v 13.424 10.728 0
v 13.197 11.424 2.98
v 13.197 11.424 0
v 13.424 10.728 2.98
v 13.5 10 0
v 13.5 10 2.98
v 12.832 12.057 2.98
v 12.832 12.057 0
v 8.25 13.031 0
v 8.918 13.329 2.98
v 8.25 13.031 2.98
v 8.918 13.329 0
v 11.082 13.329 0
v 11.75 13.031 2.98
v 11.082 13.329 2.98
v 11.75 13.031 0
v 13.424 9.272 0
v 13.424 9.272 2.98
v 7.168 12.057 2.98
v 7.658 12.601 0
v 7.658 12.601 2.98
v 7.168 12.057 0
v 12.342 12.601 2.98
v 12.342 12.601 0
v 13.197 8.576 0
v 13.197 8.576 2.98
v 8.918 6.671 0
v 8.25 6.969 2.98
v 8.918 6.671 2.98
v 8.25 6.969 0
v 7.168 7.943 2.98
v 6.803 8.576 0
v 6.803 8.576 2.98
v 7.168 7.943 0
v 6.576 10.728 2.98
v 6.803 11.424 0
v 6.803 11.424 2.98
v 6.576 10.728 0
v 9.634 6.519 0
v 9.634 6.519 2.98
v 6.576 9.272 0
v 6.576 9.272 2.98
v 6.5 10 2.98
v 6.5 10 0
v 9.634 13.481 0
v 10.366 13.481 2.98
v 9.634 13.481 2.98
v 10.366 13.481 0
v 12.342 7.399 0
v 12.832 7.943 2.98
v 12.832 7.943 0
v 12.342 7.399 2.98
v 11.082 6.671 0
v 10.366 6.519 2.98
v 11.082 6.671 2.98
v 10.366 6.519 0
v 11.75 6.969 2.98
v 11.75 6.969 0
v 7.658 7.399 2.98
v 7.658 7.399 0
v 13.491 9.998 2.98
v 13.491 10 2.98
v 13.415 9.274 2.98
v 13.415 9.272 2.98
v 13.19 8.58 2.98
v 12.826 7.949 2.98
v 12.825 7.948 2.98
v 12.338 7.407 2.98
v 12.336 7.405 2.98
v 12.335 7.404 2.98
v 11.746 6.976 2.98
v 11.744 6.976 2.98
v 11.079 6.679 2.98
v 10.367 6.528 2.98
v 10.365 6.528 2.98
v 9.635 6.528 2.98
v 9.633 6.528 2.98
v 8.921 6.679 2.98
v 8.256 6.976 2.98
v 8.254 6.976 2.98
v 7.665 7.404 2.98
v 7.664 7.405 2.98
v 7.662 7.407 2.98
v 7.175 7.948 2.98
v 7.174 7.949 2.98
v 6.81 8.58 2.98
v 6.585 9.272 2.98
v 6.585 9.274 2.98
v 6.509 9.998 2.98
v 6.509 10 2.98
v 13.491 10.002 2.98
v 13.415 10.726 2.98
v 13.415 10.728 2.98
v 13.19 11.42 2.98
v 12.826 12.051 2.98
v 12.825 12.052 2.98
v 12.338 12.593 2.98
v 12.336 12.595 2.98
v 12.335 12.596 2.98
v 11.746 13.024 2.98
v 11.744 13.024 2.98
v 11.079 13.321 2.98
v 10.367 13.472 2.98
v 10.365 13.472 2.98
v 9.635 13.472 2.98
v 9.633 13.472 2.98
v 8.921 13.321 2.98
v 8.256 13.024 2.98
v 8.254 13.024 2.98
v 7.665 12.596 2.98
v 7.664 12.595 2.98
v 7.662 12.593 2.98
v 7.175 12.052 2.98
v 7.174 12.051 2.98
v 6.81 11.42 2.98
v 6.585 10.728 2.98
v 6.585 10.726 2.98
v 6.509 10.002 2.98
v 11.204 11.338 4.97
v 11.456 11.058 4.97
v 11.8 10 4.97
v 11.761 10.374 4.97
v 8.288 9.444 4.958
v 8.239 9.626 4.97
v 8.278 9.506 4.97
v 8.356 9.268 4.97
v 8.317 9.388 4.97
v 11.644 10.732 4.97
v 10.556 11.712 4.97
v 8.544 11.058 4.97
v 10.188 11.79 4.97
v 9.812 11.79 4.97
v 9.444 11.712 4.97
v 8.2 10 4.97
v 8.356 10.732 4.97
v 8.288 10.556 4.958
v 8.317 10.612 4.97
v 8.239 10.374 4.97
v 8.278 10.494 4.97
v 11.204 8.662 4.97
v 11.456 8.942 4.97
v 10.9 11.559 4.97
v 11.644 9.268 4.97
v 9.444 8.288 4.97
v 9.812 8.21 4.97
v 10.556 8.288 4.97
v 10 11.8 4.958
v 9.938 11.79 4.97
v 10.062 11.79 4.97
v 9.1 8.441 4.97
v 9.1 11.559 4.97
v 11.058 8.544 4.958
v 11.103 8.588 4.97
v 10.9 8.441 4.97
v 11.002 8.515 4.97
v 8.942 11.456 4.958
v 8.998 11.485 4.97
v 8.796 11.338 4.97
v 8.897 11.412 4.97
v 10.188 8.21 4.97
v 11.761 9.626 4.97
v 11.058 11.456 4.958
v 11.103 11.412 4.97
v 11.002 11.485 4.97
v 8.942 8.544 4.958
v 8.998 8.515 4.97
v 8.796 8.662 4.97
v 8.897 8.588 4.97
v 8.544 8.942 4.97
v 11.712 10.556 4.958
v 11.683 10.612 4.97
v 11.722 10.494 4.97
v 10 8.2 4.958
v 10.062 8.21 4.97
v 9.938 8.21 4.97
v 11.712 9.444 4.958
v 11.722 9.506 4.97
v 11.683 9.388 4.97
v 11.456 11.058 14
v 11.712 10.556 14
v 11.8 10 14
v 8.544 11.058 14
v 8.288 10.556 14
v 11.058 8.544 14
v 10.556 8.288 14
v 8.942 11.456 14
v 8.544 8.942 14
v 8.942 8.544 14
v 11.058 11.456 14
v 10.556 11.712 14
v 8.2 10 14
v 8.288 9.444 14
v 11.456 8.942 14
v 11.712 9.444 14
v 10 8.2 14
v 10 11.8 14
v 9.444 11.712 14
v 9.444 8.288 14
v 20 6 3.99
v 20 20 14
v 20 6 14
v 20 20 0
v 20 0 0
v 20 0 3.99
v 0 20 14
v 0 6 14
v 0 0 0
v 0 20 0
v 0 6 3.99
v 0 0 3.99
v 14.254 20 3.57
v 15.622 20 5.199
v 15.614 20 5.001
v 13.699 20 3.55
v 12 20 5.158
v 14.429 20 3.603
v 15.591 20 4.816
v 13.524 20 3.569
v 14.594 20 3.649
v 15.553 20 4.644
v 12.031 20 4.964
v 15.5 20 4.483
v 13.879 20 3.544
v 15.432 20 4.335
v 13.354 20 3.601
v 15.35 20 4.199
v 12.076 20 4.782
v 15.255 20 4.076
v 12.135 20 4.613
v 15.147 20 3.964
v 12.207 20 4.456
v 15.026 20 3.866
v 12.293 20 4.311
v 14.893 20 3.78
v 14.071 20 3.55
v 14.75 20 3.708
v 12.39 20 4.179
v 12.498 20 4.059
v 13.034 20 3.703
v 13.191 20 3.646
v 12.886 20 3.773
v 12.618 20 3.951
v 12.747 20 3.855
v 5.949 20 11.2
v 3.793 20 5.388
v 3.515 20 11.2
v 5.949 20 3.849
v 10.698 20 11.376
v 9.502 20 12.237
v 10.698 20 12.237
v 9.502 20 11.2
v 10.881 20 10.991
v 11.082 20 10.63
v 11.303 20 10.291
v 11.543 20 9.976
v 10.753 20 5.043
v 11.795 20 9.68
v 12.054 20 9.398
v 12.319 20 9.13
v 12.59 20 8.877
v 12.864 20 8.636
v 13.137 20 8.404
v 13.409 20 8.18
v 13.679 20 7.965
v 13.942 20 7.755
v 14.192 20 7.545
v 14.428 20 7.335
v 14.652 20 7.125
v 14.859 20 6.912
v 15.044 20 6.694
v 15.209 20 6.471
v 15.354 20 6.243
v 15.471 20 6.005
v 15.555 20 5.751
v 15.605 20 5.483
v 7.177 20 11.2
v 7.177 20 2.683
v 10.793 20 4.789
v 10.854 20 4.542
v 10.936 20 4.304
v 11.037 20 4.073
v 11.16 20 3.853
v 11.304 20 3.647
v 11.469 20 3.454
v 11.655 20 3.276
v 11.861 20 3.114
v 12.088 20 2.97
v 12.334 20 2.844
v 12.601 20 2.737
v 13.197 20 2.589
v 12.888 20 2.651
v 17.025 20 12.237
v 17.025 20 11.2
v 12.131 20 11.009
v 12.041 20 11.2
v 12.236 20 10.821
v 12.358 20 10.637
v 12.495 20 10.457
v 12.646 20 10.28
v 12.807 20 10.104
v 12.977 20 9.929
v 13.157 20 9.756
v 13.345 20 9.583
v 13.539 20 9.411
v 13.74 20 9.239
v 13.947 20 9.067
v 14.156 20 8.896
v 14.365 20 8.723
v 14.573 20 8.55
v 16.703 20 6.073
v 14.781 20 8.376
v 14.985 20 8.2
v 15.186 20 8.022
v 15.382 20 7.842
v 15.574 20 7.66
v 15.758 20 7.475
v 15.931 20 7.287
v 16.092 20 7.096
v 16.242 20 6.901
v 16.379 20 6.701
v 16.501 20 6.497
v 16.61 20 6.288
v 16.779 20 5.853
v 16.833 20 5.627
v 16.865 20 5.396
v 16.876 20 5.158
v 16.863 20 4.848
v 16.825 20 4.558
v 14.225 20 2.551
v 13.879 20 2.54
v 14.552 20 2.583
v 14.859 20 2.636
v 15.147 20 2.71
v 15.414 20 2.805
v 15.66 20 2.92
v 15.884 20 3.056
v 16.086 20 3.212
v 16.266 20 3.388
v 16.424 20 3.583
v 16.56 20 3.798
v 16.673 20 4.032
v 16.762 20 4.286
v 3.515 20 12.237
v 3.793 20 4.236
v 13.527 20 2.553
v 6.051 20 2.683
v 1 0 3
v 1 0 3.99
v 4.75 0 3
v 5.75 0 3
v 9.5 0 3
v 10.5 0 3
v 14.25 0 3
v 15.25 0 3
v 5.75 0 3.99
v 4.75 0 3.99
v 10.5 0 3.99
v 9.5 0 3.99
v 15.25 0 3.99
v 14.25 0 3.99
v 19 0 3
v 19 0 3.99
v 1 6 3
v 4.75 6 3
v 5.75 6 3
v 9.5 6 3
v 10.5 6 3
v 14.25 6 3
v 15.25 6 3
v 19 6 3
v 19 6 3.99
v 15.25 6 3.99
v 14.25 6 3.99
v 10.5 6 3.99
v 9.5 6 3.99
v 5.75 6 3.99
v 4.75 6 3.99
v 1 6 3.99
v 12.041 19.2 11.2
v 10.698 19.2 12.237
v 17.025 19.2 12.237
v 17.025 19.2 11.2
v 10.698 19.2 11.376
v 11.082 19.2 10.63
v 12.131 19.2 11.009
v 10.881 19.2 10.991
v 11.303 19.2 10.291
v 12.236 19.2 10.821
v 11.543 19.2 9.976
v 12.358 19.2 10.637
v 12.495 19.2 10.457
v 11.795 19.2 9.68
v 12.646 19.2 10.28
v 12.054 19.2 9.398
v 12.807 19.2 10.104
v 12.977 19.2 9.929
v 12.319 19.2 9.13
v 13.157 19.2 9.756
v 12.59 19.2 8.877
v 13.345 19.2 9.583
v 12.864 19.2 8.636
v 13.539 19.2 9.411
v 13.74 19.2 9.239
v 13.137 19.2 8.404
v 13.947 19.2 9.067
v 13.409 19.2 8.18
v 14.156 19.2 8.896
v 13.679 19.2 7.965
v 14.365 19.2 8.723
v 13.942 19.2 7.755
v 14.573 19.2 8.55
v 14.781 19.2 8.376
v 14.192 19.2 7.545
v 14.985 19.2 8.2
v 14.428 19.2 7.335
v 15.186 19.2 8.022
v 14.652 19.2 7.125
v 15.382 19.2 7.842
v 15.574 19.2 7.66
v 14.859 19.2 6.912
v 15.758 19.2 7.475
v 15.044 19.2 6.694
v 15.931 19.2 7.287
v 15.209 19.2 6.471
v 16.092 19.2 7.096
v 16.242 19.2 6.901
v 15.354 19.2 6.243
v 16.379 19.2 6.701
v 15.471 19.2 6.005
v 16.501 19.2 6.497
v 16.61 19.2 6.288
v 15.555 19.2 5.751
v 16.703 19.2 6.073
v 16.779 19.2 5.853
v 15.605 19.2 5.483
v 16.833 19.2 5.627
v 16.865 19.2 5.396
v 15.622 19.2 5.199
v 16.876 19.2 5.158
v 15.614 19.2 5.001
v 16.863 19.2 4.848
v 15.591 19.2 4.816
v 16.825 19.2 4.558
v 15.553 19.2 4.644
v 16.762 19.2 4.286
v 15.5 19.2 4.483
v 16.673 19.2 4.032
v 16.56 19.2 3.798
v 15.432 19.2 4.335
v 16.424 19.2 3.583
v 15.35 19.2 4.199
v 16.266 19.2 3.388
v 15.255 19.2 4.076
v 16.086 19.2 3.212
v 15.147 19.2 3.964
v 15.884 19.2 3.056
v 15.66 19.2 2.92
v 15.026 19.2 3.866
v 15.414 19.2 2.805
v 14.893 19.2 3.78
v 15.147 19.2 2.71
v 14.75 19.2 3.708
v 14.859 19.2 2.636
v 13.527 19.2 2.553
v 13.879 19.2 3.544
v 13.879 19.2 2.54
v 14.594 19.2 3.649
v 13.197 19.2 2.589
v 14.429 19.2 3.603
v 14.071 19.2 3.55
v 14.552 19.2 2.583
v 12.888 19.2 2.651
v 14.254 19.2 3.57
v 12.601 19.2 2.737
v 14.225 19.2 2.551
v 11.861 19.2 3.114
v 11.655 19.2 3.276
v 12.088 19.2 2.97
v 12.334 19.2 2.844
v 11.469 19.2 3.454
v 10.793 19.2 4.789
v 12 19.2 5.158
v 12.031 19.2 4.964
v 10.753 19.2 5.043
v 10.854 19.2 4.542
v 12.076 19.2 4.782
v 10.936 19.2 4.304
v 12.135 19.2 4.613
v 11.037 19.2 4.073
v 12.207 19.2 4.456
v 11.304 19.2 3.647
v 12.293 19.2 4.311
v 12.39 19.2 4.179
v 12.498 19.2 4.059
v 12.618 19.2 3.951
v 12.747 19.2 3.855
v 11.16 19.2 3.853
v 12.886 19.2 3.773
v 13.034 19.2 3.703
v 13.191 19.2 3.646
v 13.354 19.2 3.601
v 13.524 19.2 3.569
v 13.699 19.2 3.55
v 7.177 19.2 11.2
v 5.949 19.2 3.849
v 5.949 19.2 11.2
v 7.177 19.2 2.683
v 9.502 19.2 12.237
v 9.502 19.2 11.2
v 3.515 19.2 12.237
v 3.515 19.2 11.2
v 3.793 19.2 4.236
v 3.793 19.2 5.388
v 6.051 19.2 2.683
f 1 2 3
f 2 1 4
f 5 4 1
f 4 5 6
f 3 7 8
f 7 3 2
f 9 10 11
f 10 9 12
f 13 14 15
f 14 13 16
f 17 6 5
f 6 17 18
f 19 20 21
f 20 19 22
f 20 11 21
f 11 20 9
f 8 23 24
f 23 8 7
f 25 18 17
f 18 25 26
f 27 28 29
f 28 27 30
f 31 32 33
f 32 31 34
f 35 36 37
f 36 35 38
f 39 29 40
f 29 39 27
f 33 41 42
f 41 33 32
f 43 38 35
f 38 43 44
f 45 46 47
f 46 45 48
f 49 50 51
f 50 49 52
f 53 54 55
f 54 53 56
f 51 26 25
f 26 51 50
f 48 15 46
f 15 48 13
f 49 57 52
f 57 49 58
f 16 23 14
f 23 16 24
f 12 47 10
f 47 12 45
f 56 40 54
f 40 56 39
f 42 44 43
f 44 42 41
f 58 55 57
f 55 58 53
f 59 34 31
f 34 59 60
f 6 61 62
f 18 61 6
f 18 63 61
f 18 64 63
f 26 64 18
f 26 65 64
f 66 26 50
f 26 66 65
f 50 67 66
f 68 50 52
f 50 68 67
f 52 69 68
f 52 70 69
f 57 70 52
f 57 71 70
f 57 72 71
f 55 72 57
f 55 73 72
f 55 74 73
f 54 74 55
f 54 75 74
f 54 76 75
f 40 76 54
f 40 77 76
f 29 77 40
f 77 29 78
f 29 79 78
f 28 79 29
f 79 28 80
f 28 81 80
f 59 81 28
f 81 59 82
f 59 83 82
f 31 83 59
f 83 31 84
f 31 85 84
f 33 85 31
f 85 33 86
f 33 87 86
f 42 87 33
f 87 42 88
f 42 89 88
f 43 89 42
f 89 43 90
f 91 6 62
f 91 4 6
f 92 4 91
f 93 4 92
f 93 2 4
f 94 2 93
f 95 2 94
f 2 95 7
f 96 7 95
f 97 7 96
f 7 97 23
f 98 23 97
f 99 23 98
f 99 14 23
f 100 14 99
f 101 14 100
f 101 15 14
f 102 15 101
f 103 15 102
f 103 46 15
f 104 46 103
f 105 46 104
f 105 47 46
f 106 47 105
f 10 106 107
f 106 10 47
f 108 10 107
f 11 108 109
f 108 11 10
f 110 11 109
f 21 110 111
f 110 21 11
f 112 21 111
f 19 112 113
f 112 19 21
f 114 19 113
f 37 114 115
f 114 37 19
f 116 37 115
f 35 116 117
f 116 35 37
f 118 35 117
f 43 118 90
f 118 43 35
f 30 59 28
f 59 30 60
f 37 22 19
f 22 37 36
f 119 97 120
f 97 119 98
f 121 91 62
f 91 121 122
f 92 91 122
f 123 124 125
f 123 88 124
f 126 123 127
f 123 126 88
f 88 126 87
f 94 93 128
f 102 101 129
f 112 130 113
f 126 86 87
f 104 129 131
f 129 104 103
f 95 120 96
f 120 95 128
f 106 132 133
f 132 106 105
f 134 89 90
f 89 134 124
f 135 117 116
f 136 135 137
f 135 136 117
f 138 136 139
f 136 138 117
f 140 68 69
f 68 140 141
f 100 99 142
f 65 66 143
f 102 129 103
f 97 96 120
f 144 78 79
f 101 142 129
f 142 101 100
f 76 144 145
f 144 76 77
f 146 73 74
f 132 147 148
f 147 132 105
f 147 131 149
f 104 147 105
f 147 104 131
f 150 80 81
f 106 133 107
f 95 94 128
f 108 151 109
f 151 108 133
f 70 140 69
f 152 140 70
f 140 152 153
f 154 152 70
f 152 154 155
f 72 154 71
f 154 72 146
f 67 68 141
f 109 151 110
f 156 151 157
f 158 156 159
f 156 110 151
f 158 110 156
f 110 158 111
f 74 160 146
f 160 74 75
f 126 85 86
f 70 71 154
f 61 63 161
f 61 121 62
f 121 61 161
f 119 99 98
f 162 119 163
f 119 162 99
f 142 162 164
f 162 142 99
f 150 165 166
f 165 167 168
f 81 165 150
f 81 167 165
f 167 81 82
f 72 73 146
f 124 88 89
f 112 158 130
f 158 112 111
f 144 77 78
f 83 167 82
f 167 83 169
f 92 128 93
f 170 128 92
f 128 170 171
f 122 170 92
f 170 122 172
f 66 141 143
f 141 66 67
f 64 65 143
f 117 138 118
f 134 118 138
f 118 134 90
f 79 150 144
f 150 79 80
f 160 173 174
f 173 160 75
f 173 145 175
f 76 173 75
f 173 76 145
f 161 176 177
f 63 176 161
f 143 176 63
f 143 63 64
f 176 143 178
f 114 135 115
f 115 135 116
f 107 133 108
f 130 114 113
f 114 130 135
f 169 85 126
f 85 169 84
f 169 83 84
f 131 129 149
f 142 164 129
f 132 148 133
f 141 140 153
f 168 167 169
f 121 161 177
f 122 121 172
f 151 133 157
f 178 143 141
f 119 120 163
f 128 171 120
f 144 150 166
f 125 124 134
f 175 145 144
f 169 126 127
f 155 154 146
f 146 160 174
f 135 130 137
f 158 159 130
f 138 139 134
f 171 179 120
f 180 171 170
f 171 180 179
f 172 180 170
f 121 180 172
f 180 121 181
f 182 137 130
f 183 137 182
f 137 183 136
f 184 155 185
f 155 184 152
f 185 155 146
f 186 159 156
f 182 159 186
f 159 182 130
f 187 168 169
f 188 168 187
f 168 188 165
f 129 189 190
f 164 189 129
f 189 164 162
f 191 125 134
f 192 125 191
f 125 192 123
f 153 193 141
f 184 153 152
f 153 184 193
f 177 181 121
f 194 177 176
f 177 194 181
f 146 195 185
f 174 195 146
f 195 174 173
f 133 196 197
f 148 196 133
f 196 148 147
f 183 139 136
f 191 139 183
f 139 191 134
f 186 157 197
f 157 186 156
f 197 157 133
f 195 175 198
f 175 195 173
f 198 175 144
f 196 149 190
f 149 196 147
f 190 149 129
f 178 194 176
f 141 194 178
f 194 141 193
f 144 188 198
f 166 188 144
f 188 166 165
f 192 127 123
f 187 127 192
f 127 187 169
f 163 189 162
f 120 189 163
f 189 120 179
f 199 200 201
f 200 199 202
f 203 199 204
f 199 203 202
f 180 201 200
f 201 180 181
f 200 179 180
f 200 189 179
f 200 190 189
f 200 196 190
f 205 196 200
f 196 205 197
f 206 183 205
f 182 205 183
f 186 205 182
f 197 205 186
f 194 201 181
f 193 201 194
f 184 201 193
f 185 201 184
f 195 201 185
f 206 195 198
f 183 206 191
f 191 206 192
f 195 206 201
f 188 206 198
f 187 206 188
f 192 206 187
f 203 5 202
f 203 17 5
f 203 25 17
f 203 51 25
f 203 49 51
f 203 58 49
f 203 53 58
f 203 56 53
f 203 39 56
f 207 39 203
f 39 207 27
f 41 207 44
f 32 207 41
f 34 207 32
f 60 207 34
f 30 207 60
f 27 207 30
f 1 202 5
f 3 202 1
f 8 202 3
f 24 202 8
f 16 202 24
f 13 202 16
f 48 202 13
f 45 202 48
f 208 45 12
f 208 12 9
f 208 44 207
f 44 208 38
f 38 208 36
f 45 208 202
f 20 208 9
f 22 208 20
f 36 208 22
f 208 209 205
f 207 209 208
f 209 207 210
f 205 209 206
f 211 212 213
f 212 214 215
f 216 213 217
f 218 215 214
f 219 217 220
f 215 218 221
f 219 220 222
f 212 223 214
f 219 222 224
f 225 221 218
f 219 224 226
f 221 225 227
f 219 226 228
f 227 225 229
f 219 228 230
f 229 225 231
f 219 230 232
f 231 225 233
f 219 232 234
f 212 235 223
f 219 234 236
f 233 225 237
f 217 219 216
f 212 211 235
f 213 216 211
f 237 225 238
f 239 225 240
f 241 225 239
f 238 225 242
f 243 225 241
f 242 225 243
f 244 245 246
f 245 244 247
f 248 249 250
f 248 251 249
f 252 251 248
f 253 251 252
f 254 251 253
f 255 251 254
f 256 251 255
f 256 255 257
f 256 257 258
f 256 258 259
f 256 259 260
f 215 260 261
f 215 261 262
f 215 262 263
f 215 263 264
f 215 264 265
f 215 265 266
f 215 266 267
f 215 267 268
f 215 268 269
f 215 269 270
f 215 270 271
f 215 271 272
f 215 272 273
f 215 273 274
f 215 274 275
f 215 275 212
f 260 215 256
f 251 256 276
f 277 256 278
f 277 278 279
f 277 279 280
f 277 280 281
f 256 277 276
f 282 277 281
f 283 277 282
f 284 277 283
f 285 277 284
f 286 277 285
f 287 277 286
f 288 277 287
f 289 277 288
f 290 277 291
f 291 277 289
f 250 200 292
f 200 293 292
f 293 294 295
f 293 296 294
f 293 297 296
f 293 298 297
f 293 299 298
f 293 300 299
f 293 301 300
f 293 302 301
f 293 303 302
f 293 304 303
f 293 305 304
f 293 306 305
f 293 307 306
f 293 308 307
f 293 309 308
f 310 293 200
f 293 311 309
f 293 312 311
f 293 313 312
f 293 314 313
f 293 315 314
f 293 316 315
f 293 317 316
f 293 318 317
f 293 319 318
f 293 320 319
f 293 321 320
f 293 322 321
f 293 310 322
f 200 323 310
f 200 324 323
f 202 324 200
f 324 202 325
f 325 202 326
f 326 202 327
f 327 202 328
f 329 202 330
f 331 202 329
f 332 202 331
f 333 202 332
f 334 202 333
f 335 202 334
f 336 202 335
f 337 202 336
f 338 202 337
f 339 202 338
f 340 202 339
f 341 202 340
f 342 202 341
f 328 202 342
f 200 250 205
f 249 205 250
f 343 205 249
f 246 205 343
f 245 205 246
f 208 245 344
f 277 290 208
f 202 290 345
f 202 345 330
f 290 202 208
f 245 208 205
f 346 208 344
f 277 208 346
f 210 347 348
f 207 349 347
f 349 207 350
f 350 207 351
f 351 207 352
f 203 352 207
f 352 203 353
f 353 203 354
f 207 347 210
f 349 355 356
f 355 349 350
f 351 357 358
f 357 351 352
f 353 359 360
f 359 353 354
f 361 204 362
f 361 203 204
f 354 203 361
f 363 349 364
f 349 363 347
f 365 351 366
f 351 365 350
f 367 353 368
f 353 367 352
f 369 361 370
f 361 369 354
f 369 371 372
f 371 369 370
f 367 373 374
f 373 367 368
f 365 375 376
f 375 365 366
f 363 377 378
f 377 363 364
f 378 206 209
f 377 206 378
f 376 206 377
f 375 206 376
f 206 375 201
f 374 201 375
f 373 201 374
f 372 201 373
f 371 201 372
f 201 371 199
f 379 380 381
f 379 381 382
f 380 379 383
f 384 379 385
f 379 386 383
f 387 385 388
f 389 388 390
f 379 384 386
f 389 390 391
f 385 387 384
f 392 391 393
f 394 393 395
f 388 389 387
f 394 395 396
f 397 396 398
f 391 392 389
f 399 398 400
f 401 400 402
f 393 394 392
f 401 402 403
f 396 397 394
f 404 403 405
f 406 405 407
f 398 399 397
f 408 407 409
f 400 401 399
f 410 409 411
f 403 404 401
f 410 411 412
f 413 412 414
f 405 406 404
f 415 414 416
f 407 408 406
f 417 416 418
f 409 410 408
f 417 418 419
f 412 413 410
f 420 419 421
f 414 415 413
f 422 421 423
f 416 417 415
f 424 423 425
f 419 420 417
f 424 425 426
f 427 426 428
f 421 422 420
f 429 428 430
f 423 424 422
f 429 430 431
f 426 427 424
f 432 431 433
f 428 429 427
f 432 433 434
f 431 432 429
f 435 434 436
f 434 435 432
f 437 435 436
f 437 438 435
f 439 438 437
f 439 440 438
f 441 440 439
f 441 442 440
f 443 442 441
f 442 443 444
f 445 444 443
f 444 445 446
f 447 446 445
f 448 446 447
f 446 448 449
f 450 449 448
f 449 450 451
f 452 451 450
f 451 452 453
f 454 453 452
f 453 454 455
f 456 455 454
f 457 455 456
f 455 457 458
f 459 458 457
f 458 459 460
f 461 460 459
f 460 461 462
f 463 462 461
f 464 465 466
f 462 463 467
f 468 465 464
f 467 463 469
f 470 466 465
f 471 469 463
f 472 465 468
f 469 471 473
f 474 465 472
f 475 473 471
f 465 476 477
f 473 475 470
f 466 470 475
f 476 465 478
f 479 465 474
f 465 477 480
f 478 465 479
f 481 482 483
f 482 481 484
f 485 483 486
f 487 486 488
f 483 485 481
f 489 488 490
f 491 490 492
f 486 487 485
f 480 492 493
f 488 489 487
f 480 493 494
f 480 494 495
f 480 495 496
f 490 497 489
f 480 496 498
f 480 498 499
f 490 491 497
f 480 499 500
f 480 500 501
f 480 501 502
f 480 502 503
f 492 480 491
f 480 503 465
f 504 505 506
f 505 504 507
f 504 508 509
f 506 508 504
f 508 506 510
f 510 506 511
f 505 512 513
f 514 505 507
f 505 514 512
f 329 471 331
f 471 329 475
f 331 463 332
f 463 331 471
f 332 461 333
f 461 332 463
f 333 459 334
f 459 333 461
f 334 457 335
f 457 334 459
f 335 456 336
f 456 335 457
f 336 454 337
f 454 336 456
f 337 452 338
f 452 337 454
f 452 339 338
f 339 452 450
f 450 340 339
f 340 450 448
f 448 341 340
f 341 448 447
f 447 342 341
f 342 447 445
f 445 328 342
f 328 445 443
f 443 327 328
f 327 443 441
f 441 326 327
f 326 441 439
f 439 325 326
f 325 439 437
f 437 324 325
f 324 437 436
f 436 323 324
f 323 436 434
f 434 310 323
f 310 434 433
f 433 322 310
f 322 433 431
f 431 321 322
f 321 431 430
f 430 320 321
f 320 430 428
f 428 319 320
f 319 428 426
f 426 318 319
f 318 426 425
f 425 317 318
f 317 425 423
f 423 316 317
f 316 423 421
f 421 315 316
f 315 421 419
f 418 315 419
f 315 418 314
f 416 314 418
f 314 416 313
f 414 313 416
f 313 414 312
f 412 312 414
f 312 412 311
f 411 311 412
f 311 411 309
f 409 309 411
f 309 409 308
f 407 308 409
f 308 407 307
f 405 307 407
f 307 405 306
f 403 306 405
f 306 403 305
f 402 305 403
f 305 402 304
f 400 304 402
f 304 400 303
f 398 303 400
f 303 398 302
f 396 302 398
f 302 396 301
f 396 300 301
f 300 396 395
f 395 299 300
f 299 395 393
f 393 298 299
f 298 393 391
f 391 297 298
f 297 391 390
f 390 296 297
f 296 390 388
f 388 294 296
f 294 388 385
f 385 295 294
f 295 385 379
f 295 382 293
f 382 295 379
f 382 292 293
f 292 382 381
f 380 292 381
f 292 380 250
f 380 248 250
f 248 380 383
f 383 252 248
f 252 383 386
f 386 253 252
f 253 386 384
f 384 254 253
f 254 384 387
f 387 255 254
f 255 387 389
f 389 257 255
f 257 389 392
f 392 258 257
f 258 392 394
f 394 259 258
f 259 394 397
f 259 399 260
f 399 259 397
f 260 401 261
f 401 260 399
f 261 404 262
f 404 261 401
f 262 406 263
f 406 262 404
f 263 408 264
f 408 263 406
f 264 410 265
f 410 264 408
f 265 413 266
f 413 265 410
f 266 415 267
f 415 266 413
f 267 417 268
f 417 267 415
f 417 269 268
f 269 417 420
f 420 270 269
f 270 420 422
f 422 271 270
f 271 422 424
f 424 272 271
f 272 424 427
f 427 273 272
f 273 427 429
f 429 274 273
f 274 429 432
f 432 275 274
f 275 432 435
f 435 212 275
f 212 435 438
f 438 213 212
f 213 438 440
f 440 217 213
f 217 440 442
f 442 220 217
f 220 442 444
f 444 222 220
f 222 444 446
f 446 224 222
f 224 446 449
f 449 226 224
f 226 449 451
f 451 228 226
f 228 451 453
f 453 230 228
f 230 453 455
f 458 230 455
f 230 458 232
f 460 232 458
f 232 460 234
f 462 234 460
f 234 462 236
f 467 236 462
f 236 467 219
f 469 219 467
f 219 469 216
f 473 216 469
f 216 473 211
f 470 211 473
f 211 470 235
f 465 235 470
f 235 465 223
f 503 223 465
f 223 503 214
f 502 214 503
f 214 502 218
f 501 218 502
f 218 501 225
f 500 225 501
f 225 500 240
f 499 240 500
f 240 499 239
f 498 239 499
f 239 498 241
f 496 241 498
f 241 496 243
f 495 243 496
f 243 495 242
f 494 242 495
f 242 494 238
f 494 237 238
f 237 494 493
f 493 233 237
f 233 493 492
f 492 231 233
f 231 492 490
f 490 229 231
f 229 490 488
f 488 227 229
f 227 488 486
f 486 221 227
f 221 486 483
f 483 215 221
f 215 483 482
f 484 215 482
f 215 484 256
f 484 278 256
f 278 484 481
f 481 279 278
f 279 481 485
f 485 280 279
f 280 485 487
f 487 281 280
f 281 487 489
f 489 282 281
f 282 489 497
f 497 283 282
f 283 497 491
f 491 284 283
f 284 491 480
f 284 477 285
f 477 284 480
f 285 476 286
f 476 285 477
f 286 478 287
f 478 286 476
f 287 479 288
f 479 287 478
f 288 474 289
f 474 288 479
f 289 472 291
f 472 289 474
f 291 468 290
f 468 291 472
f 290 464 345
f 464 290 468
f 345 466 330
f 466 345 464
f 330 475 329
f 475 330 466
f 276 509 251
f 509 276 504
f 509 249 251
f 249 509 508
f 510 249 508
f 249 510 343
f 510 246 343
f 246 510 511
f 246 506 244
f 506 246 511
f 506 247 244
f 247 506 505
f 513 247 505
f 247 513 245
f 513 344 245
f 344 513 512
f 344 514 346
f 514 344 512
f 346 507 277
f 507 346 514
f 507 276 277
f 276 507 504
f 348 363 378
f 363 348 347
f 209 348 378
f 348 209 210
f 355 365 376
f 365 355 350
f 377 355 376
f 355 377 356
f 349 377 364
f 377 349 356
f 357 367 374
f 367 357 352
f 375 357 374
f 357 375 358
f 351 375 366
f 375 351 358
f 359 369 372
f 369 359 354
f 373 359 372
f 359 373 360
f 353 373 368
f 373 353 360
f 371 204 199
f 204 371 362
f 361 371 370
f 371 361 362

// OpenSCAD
part="fclamp";
diag_flat=1;
fclamp_guide=0;
fclamp_gh=1.5;
fclamp_mh=12;
fclamp_lip=6;
fclamp_recess=3;
fclamp_lh=3;
fclamp_grip=1;

if(part=="corner_90"||part=="all")
  corner_90();
if(part=="corner_straight")
  corner_straight();
if(part=="outer_flat_connector")
{
  outer_flat_connector();
  translate([-7.5,10.4]) cube([35,60,20]);
}
if(part=="sclamp")
{
  sclamp();
}
if(part=="fclamp")
{
  fclamp(fclamp_mh,fclamp_lip);
}
module sclamp(width=5,dist=10)
{
  
}
module fclamp(mh=3,lip=6,guide=fclamp_guide,gh=fclamp_gh)
{
  difference(){
    union(){
      cube([20,20,mh+2]);
      if(guide)
        translate([0,7.2,mh+2]) translate([10,2.8]) rotate([0,0,90*guide]) translate([-10,-2.8]) cube([20,5.6,gh]);
    }
    translate([10,10,-.01]) {
      if(fclamp_recess)
      {
        translate([0,0,-.01]) cylinder(d=7,h=fclamp_recess,$fn=30);
        translate([0,0,fclamp_recess-.02]) cylinder(d1=7,d2=3.6,h=2,$fn=30);
      }
      cylinder(d=3.6,h=mh+gh+5.02,$fn=20);
    }
    translate([-.1,-.1,fclamp_lh]) cube([20.2,lip+.1,mh+gh+5]);
    translate([10,20.01,fclamp_lh/2+mh/2]) rotate([90,0]) linear_extrude(0.81) {
      mirror([1,0]) rotate([0,0,180]) text(str(mh),size=mh>8?10:mh,valign="center",halign="center");
    }
  }
  if(fclamp_grip)
    for(x=[0:19/4:19])
      translate([x,0,fclamp_lh-.01]) cube([1,lip,1]);
}
module outer_flat_connector(rows=[1,0,0,0,1],cols=[0,0]) {
  posx=[0:20:len(cols)*20-1];
  posy=[0:20:len(rows)*20-1];
  difference() {
    union() {
      for(i=[0:len(rows)-1])
        if(rows[i])
        translate([0,0,3]) linear_extrude(1.98) hull() {
          translate([0,i*20]) circle(d=5.6,$fn=24);
          translate([(len(cols)-1)*20,i*20]) circle(d=5.6,$fn=24);
        }
      *for(i=[0:rows-1])
        translate([0,0,3]) linear_extrude(2) hull() {
          translate([i*20,0]) circle(d=5.6,$fn=24);
          translate([i*20,(cols-1)*20]) circle(d=5.6,$fn=24);
        }
      linear_extrude(3,convexity=3) hull()
      {
        for(x=posx,y=posy)
          translate([x,y]) circle(d=15,$fn=40);
      }
      linear_extrude(3) for(x=posx,y=posy)
        if(rows[y/20])
        translate([x,y]) circle(d=18,$fn=40);
    }
    translate([0,0,-.1]) linear_extrude(8,convexity=3)
      for(x=posx,y=posy)
          if(rows[y/20])
        translate([x,y]) circle(d=3.6,$fn=20);
    for(x=posx,y=posy) translate([x,y,3]) cylinder(d1=12,d2=16,h=2,$fn=30);
  }
}
module corner_straight(flat_diag=diag_flat) {
  intersection() {
    rotate([flat_diag==1?225:(flat_diag==2?45:0),0,0])
    difference() {
      union() {
        cube([20,20+(flat_diag?3:0),20+(flat_diag?3:0)]);
        translate([7.2,-1,0]) difference() {
          cube([5.6,2,20]);
          translate([-.1,-.1,7.5]) cube([6,3,8]);
        }
        if(flat_diag)
        translate([7.2,-1,-1]) difference() {
          cube([5.6,21,2]);
          translate([-.1,9.5,-.1]) cube([6,6,3]);
        }
      }
      translate([-.1,20,3]) cube([20.2,4.2,5]);
      translate([3,3,3]) cube([14,18,18]);
      translate([-.1,23,0]) rotate([45,0]) cube([23,23,35]);
      for(y=[11.5])
        translate([10,y,-2.1]) cylinder(d=3.6,h=5.2,$fn=20);
      translate([10,-2.1,11.5]) rotate([-90,0]) cylinder(d=3.6,h=5.2,$fn=20);
        if(flat_diag)
        {
          translate([-.1,20,0]) rotate([-45,0]) translate([0,0,-5]) cube([20.2,5,10]);
          translate([-.1,0,20]) rotate([45,0,0]) translate([0,-5]) cube([20.2,15,5]);
        }
    }
    if(flat_diag==1)
      translate([-.1,-20,-20]) cube([20.2,40,19]);
    if(flat_diag==2)
      translate([-.1,-20,5]) cube([20.2,40,20]);
  }
}
module corner_90(flat_diag=diag_flat, flat_bottom=!diag_flat) {
  rotate(flat_diag?[225,0,0]:[])
    difference() {
      union() {
        cube([20,20+(flat_diag?0:0),20+(flat_diag?3:0)]);
        translate([7.2,-1,0]) difference() {
          cube([5.6,2,20]);
          translate([-.1,-.1,7.5]) cube([6,3,8]);
        }
        if(!flat_bottom)
        translate([0,7.2,-1]) difference() {
          cube([20,5.6,2]);
          translate([6,-.1,-.1]) cube([8,6,3]);
        }
      }
      translate([-.1,20,3]) cube([20.2,4.2,5]);
      translate([3,3,3]) cube([14,18,18]);
      translate([-.1,23,0]) rotate([45,0]) translate([0,0,0]) cube([23,23,35]);
      for(y=[10])
        translate([10,y,-2.1]) cylinder(d=3.6,h=5.2,$fn=20);
      translate([10,-2.1,11.5]) rotate([-90,0]) cylinder(d=3.6,h=5.2,$fn=20);
      if(flat_diag)
      {
        translate([-.1,20,-.1]) rotate([-45,0]) //translate([0,-2,-2])
          cube([20.2,15,5]);
        translate([-.1,0,20]) rotate([45,0,0]) translate([0,-5]) cube([20.2,15,5]);
      }
    }
}
